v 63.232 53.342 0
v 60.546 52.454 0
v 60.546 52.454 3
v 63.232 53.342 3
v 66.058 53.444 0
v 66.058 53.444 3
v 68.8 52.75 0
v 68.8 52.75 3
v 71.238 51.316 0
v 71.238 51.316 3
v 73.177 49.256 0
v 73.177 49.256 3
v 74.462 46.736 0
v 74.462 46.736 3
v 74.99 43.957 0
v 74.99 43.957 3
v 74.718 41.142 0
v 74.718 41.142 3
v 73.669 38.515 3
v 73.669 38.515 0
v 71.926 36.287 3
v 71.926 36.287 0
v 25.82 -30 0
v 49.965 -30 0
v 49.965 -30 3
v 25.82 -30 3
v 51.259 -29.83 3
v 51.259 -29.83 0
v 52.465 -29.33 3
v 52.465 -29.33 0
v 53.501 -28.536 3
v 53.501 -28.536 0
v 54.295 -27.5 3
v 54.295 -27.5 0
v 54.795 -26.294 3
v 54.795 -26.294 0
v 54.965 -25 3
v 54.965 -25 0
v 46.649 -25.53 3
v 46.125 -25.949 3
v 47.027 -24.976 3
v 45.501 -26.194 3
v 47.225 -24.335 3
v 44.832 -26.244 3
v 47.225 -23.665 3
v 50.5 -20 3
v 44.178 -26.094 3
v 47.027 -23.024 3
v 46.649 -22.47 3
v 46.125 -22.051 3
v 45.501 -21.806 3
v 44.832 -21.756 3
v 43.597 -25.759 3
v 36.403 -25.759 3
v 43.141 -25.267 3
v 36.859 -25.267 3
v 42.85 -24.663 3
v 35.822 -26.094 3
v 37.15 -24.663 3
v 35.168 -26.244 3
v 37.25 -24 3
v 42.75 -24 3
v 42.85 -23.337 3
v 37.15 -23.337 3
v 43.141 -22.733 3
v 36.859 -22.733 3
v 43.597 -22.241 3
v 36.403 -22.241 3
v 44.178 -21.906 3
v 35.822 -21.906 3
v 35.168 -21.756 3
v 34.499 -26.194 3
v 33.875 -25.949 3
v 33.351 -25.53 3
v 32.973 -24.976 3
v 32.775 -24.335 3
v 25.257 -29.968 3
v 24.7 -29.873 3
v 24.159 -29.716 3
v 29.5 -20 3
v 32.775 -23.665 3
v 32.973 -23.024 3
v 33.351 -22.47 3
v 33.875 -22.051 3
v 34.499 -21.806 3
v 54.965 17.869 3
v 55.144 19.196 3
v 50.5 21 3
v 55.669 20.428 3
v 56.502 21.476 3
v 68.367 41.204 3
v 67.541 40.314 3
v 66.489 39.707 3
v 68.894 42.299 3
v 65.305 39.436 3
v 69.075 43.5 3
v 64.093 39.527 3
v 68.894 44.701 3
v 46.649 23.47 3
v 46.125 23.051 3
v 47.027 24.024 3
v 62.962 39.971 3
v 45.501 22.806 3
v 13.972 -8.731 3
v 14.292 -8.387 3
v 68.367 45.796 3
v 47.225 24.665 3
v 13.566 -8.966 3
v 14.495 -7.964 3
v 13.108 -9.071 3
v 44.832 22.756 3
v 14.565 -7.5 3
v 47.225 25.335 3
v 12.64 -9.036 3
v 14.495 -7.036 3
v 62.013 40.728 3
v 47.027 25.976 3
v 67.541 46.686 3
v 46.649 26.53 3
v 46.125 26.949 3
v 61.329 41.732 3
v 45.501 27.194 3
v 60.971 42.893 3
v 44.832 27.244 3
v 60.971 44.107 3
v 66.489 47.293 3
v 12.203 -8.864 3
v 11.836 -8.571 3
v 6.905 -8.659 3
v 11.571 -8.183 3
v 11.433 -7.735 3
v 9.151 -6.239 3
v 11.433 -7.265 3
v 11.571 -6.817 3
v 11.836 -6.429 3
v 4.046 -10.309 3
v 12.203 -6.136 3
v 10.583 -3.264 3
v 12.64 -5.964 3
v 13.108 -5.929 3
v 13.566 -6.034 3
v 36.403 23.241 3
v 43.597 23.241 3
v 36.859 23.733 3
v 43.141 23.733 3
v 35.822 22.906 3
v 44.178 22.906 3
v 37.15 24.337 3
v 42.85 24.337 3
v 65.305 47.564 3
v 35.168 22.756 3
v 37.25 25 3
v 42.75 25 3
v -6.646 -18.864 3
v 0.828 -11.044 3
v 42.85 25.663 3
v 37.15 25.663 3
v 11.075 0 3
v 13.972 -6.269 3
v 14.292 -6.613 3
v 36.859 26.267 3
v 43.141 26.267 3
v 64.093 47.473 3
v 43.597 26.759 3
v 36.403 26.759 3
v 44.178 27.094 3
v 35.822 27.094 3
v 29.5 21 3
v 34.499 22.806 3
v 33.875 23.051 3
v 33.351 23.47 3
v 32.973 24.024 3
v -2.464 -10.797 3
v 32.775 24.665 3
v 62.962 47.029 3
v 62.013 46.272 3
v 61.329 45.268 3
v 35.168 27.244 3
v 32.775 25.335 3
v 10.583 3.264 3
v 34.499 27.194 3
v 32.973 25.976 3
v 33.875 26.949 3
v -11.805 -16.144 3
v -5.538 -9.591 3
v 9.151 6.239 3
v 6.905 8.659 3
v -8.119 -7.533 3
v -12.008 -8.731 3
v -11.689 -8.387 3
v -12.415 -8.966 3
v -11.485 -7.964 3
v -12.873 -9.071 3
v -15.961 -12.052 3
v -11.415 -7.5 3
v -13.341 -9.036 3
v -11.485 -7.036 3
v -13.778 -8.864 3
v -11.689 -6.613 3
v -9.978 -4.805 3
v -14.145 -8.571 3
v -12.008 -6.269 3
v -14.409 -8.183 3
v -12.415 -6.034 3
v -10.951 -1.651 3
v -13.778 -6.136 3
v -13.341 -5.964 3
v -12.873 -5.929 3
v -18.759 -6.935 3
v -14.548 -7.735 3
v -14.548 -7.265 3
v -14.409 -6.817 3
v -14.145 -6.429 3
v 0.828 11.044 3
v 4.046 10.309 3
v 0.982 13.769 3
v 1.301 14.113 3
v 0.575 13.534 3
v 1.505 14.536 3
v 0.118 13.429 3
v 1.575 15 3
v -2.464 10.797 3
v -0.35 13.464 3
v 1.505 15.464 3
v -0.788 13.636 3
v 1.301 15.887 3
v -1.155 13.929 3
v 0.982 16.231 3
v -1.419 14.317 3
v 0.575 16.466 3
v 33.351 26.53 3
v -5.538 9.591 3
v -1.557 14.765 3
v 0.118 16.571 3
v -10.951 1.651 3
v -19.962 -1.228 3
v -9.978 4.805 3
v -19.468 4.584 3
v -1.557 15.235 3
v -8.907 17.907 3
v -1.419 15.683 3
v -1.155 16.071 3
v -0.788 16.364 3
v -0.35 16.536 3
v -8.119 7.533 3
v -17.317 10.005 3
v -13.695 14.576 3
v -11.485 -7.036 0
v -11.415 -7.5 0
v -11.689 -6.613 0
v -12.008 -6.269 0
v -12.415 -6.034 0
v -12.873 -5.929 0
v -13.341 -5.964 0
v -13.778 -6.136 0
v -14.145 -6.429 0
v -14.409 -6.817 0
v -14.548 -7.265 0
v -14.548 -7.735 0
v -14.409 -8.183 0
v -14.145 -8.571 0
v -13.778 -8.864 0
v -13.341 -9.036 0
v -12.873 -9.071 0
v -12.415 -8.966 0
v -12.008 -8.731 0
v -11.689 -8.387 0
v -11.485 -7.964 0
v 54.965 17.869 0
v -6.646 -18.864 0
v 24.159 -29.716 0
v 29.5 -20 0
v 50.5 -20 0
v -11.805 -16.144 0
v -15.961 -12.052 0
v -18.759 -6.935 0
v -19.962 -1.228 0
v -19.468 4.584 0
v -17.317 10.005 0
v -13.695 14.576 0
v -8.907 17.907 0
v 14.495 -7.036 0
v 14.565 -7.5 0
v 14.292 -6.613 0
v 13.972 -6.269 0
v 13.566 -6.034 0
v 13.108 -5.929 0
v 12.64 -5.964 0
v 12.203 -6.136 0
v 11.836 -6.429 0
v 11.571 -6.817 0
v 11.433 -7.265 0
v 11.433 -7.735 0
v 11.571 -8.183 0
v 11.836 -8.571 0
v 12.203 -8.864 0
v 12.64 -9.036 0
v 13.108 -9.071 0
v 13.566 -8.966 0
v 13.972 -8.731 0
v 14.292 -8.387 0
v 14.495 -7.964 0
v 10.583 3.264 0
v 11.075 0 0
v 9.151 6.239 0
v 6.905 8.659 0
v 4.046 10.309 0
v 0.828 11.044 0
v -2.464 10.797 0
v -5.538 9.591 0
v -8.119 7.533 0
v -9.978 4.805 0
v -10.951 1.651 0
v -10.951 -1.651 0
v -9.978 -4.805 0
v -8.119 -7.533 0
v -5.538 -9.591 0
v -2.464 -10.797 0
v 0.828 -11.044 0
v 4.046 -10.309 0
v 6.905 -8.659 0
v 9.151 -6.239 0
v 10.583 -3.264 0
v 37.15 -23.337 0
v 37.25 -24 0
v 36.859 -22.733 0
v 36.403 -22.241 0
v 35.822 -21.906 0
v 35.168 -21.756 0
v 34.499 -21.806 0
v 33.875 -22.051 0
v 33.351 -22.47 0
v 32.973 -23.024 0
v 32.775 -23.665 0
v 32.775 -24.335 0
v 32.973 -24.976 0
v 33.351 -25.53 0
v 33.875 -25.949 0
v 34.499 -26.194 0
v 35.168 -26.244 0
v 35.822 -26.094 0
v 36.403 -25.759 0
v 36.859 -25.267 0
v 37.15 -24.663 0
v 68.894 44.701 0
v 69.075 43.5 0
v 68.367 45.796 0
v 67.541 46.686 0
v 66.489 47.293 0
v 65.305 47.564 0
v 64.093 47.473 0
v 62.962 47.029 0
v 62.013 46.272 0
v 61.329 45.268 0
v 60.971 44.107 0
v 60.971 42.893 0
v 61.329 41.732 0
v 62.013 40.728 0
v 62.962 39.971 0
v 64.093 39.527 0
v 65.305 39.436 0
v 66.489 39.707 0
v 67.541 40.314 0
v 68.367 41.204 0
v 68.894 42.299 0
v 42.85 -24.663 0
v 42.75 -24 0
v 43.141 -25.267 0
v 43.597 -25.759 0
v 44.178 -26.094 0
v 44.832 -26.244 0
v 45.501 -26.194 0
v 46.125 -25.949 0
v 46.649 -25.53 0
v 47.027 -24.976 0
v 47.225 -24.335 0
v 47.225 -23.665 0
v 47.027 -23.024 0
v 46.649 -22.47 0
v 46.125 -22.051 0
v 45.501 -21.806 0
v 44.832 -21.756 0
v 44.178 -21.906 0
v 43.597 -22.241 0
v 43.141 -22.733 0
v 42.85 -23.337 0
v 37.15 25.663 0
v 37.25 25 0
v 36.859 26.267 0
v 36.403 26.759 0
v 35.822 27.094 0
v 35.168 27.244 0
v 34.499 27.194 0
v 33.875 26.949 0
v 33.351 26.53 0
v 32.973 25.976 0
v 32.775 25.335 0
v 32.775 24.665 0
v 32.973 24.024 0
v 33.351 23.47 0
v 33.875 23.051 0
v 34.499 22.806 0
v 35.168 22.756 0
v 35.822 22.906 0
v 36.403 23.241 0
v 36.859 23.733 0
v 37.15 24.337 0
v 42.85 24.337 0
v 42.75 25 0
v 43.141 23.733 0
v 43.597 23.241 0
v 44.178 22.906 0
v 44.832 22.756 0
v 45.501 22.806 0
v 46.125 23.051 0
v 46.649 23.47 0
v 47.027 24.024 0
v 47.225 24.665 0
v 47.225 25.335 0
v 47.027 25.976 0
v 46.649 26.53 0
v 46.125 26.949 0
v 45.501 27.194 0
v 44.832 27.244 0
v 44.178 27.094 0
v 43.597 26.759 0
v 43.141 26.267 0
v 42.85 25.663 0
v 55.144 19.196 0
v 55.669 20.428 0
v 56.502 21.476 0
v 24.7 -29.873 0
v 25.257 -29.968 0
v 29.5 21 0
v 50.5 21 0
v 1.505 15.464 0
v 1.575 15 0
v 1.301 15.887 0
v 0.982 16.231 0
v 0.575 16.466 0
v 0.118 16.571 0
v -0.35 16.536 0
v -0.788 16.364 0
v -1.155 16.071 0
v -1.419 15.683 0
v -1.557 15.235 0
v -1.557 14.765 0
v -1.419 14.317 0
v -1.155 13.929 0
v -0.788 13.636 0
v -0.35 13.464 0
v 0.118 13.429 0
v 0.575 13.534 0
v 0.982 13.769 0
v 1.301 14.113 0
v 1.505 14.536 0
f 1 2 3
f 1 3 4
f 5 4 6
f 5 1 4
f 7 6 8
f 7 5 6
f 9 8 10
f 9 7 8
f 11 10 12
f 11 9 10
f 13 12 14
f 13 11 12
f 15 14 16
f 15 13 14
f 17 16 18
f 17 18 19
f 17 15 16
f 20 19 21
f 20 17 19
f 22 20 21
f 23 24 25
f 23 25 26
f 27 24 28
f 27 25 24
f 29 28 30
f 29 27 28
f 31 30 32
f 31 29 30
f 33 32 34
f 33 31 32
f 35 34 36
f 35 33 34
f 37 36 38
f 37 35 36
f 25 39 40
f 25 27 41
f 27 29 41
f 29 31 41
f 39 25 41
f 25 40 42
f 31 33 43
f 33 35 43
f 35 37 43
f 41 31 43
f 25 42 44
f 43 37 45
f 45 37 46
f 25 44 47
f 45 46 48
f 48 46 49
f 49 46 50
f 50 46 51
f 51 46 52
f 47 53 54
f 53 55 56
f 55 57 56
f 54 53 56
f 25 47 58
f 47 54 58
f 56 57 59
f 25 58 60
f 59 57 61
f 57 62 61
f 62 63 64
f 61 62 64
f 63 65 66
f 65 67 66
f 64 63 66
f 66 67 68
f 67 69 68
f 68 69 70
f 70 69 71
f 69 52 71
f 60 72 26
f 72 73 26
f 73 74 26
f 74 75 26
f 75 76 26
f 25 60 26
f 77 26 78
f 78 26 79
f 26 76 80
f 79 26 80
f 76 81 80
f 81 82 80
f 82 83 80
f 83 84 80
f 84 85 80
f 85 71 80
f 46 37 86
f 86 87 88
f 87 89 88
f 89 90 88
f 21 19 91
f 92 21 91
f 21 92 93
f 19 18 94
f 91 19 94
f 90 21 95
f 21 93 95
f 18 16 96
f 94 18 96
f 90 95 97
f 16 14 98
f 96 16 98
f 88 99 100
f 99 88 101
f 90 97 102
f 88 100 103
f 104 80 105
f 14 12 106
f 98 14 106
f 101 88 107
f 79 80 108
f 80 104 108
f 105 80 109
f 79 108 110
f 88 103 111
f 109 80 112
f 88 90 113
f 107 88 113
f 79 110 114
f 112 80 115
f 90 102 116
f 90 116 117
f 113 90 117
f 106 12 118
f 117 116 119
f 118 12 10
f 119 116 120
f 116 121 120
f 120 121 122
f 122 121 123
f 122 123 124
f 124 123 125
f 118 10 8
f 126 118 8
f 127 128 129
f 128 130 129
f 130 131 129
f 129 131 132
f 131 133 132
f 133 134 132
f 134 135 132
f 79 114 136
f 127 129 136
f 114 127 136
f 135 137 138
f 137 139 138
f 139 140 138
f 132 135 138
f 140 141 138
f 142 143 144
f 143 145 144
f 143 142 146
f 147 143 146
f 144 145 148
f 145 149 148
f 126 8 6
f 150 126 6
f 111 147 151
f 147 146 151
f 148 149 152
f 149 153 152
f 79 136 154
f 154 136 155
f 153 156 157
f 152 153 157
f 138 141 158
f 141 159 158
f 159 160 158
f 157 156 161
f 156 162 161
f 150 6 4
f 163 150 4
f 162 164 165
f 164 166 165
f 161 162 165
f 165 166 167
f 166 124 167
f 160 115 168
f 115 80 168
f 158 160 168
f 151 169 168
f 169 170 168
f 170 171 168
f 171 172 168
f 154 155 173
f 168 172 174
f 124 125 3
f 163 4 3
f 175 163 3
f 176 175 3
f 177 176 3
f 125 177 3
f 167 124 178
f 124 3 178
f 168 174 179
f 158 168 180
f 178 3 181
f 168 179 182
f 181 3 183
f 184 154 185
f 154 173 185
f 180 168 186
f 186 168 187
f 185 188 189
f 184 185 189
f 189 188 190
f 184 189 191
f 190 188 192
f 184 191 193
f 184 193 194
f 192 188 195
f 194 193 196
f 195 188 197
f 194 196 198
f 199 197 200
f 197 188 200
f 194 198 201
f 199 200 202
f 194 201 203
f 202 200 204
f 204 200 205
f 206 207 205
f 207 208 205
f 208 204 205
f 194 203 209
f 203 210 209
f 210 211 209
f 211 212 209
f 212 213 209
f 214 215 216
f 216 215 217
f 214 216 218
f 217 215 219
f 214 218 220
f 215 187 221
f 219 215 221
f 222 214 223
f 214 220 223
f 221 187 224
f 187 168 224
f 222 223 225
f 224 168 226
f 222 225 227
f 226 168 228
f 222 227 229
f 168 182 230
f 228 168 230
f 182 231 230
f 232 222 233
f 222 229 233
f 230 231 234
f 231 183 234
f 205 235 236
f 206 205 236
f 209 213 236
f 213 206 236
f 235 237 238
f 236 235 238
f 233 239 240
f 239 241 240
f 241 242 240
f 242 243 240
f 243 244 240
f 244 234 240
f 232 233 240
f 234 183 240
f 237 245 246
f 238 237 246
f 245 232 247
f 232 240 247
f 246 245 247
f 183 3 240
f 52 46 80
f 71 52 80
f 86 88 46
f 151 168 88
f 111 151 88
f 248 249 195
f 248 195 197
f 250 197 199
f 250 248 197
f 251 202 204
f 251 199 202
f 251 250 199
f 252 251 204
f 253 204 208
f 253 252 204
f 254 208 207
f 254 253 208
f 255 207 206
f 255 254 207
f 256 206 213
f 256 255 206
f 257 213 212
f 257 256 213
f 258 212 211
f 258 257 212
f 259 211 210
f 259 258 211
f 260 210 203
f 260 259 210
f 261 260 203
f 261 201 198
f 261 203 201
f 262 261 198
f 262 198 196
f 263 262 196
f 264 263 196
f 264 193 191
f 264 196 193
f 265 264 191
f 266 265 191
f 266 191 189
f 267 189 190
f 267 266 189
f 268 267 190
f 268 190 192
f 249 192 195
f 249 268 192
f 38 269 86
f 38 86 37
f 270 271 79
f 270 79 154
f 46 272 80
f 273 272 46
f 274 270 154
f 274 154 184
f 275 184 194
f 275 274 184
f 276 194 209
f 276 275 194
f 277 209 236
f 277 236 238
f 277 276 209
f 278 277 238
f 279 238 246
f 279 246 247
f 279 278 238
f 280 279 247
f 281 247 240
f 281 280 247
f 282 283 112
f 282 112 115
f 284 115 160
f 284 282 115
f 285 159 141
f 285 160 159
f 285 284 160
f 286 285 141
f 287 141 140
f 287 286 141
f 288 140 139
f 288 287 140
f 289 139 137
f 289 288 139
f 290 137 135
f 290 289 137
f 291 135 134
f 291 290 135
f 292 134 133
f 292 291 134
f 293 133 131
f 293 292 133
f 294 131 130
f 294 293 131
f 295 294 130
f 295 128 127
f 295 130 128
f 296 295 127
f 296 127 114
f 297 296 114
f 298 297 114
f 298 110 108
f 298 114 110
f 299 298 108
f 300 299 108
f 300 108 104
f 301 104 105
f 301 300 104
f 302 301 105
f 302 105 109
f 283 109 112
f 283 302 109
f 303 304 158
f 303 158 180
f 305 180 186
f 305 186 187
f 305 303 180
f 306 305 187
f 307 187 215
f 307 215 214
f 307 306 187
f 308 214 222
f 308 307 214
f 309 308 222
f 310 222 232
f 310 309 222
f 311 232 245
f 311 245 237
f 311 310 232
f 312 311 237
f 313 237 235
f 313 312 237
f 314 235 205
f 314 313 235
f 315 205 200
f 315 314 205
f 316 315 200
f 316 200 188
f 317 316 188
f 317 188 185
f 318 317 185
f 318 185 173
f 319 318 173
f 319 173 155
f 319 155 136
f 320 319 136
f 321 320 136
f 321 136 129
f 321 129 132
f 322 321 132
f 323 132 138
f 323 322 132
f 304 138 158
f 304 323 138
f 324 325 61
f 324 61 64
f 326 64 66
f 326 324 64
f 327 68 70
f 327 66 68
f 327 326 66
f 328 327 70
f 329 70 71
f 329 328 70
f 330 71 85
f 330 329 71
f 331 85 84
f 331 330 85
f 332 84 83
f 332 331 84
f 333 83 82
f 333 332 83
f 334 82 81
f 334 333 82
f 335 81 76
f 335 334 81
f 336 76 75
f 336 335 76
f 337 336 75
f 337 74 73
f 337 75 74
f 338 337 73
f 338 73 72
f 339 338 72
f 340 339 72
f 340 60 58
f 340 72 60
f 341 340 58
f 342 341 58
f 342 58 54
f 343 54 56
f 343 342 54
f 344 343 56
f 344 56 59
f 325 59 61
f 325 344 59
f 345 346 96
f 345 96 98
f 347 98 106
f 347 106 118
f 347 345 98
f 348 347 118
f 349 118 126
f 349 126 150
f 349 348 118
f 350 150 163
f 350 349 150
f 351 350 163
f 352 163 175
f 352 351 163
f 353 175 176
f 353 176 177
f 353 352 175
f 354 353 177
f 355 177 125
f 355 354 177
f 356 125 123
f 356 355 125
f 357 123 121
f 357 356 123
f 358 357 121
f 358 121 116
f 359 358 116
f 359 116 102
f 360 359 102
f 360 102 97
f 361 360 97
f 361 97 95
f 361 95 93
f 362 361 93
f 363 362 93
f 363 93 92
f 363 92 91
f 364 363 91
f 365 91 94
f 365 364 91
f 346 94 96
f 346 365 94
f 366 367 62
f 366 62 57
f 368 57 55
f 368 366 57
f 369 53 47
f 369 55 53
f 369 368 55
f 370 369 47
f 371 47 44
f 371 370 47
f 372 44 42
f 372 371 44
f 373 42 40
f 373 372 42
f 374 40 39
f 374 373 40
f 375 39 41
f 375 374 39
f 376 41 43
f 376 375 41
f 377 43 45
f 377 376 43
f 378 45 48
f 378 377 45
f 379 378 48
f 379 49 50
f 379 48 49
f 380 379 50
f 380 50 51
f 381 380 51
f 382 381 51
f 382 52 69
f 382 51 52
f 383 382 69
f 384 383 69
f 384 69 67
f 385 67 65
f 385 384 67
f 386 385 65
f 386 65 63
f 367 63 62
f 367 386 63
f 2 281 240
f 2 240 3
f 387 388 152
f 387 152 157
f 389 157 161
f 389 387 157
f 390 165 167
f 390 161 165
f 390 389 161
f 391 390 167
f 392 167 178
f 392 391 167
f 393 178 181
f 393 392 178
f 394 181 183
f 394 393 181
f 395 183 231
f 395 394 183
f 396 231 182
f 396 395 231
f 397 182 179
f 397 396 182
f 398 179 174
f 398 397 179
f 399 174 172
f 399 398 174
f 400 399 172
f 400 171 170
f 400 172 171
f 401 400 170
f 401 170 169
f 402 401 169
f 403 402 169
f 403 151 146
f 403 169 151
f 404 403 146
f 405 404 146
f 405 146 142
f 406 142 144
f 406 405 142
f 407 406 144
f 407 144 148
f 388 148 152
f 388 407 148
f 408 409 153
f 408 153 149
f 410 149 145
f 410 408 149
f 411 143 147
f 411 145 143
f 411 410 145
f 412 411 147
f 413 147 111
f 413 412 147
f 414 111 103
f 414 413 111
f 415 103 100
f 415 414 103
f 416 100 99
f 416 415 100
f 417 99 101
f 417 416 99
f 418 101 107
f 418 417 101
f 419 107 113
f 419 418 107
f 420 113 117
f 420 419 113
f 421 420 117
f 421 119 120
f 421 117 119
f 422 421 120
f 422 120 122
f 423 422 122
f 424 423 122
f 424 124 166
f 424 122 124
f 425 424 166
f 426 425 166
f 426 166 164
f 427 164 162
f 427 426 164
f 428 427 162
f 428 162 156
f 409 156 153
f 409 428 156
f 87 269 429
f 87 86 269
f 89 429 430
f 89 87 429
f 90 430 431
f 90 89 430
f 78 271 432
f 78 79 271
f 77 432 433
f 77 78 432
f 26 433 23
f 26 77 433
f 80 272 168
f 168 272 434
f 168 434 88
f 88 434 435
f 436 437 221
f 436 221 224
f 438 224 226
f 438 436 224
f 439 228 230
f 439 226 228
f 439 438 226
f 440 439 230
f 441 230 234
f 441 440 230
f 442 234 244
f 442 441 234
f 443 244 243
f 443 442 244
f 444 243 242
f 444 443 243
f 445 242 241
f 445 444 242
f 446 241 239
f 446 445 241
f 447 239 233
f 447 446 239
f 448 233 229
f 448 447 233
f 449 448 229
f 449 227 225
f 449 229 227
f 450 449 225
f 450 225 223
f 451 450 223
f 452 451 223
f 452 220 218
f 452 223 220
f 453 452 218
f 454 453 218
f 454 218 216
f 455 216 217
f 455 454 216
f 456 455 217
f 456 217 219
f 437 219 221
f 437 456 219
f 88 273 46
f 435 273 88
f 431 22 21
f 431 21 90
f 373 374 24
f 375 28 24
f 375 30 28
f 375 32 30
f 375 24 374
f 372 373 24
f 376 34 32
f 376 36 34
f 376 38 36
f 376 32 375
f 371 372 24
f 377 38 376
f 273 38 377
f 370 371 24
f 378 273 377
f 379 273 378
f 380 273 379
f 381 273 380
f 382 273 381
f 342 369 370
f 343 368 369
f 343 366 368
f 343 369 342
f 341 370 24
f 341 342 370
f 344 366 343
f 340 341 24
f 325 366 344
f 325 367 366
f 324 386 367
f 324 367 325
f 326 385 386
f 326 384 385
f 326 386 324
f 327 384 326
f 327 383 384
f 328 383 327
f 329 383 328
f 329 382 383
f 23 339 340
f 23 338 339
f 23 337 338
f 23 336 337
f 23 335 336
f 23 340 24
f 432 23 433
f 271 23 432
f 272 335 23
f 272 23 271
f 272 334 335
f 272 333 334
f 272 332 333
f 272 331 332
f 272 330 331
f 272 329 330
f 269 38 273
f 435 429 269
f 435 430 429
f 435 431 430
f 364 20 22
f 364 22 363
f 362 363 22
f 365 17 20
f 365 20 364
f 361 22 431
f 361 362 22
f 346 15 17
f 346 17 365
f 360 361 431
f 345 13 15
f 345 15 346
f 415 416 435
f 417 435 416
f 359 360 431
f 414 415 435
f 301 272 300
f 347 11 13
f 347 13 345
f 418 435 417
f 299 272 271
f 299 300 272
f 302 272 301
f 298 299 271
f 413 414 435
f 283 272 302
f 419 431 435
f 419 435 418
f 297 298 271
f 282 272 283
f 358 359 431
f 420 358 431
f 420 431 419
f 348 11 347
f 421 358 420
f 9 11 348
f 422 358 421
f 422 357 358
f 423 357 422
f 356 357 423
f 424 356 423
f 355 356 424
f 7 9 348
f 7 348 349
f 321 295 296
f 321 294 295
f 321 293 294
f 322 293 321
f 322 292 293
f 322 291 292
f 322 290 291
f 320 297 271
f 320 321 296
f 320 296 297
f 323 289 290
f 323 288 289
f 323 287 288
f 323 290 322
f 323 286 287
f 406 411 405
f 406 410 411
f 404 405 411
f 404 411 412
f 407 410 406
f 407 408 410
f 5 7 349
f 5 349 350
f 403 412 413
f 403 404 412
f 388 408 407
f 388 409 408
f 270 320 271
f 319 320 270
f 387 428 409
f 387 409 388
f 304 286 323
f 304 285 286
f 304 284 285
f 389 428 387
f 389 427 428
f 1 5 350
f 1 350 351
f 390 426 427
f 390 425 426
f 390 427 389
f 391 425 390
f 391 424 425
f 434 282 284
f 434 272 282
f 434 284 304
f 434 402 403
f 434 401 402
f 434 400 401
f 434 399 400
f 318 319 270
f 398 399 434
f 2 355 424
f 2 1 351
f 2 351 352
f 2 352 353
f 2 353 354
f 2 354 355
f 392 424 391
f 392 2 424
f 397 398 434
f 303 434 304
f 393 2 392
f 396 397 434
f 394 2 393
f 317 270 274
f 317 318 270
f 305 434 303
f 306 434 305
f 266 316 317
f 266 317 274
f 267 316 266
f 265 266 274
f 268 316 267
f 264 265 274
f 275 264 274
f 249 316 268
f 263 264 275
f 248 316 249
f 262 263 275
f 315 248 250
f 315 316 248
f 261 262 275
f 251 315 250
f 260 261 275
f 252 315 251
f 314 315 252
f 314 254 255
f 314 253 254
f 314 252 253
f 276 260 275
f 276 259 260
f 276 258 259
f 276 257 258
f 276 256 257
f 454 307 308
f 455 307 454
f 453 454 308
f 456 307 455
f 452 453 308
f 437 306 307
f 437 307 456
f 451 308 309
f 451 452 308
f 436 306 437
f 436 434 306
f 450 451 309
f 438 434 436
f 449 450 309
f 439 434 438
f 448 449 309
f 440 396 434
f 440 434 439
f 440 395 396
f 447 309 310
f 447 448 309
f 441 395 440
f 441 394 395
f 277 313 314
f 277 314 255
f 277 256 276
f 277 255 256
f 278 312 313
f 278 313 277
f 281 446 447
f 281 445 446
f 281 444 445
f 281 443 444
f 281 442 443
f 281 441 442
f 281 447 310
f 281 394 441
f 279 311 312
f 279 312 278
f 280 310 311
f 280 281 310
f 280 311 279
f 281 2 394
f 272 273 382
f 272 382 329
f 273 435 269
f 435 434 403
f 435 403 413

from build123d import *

# Parameters (mm, degrees)
SKETCH1_R               = 11.075
SKETCH1_R_2             = 4.075
BOSS_EXTRUDE1_DEPTH     = 3
CUT_EXTRUDE1_DEPTH      = 93.175105099
CUT_EXTRUDE1_DEPTH_BACK = 93.175105099
SKETCH2_R               = 1.575
CUT_EXTRUDE5_DEPTH      = 93.175105099
CUT_EXTRUDE5_DEPTH_BACK = 93.175105099
SKETCH6_R               = 2.25
FILLET2_R               = 5
CUT_EXTRUDE6_DEPTH      = 93.175105099
CUT_EXTRUDE6_DEPTH_BACK = 93.175105099
SKETCH7_W               = 21
SKETCH7_H               = 41


with BuildPart() as part:
    # Sketch1 → Boss-Extrude1 (new body)
    with BuildSketch(Plane.XY):
        with BuildLine():
            Line((24.96497351, -30), (-6.645635057, -18.863603439))
            ThreePointArc((-6.645635057, -18.863603439), (-19.962283564, -1.227694959), (-8.907060148, 17.907101371))
            Line((-8.907060148, 17.907101371), (60.546469926, 52.453550686))
            ThreePointArc((60.546469926, 52.453550686), (73.177271821, 49.256059899), (71.926246808, 36.28701829))
            Line((71.926246808, 36.28701829), (54.96497351, 20))
            Line((54.96497351, 20), (54.96497351, -30))
            Line((54.96497351, -30), (24.96497351, -30))
        make_face()
        Circle(SKETCH1_R, mode=Mode.SUBTRACT)
        with Locations((65, 43.5)):
            Circle(SKETCH1_R_2, mode=Mode.SUBTRACT)
    extrude(amount=BOSS_EXTRUDE1_DEPTH)

    # Sketch2 → Cut-Extrude1 (cut, two sides: drawn at the far end of the back side and taken through both)
    with BuildSketch(Plane.XY.offset(-CUT_EXTRUDE1_DEPTH_BACK)):
        with Locations((0, 15)):
            Circle(SKETCH2_R)
        with Locations((12.990381057, -7.5)):
            Circle(SKETCH2_R)
        with Locations((-12.990381057, -7.5)):
            Circle(SKETCH2_R)
    extrude(amount=CUT_EXTRUDE1_DEPTH + CUT_EXTRUDE1_DEPTH_BACK, mode=Mode.SUBTRACT)

    # Sketch6 → Cut-Extrude5 (cut, two sides: drawn at the far end of the back side and taken through both)
    with BuildSketch(Plane.XY.offset(-CUT_EXTRUDE5_DEPTH_BACK)):
        with Locations((35, -24)):
            Circle(SKETCH6_R)
        with Locations((35, 25)):
            Circle(SKETCH6_R)
        with Locations(Location((45, 25, 0), (0, 0, 180))):
            Circle(SKETCH6_R)
        with Locations(Location((45, -24, 0), (0, 0, 180))):
            Circle(SKETCH6_R)
    extrude(amount=CUT_EXTRUDE5_DEPTH + CUT_EXTRUDE5_DEPTH_BACK, mode=Mode.SUBTRACT)

    # Fillet2
    fillet2_edges = [part.edges().sort_by_distance(p)[0] for p in [
        (54.96497351, -30, 1.5),
        (24.96497351, -30, 1.5),
        (54.96497351, 20, 1.5),
    ]]
    fillet(fillet2_edges, radius=FILLET2_R)

    # Sketch7 → Cut-Extrude6 (cut, two sides: drawn at the far end of the back side and taken through both)
    with BuildSketch(Plane.XY.offset(-CUT_EXTRUDE6_DEPTH_BACK)):
        with Locations((40, 0.5)):
            Rectangle(SKETCH7_W, SKETCH7_H)
    extrude(amount=CUT_EXTRUDE6_DEPTH + CUT_EXTRUDE6_DEPTH_BACK, mode=Mode.SUBTRACT)


solid = part.part
